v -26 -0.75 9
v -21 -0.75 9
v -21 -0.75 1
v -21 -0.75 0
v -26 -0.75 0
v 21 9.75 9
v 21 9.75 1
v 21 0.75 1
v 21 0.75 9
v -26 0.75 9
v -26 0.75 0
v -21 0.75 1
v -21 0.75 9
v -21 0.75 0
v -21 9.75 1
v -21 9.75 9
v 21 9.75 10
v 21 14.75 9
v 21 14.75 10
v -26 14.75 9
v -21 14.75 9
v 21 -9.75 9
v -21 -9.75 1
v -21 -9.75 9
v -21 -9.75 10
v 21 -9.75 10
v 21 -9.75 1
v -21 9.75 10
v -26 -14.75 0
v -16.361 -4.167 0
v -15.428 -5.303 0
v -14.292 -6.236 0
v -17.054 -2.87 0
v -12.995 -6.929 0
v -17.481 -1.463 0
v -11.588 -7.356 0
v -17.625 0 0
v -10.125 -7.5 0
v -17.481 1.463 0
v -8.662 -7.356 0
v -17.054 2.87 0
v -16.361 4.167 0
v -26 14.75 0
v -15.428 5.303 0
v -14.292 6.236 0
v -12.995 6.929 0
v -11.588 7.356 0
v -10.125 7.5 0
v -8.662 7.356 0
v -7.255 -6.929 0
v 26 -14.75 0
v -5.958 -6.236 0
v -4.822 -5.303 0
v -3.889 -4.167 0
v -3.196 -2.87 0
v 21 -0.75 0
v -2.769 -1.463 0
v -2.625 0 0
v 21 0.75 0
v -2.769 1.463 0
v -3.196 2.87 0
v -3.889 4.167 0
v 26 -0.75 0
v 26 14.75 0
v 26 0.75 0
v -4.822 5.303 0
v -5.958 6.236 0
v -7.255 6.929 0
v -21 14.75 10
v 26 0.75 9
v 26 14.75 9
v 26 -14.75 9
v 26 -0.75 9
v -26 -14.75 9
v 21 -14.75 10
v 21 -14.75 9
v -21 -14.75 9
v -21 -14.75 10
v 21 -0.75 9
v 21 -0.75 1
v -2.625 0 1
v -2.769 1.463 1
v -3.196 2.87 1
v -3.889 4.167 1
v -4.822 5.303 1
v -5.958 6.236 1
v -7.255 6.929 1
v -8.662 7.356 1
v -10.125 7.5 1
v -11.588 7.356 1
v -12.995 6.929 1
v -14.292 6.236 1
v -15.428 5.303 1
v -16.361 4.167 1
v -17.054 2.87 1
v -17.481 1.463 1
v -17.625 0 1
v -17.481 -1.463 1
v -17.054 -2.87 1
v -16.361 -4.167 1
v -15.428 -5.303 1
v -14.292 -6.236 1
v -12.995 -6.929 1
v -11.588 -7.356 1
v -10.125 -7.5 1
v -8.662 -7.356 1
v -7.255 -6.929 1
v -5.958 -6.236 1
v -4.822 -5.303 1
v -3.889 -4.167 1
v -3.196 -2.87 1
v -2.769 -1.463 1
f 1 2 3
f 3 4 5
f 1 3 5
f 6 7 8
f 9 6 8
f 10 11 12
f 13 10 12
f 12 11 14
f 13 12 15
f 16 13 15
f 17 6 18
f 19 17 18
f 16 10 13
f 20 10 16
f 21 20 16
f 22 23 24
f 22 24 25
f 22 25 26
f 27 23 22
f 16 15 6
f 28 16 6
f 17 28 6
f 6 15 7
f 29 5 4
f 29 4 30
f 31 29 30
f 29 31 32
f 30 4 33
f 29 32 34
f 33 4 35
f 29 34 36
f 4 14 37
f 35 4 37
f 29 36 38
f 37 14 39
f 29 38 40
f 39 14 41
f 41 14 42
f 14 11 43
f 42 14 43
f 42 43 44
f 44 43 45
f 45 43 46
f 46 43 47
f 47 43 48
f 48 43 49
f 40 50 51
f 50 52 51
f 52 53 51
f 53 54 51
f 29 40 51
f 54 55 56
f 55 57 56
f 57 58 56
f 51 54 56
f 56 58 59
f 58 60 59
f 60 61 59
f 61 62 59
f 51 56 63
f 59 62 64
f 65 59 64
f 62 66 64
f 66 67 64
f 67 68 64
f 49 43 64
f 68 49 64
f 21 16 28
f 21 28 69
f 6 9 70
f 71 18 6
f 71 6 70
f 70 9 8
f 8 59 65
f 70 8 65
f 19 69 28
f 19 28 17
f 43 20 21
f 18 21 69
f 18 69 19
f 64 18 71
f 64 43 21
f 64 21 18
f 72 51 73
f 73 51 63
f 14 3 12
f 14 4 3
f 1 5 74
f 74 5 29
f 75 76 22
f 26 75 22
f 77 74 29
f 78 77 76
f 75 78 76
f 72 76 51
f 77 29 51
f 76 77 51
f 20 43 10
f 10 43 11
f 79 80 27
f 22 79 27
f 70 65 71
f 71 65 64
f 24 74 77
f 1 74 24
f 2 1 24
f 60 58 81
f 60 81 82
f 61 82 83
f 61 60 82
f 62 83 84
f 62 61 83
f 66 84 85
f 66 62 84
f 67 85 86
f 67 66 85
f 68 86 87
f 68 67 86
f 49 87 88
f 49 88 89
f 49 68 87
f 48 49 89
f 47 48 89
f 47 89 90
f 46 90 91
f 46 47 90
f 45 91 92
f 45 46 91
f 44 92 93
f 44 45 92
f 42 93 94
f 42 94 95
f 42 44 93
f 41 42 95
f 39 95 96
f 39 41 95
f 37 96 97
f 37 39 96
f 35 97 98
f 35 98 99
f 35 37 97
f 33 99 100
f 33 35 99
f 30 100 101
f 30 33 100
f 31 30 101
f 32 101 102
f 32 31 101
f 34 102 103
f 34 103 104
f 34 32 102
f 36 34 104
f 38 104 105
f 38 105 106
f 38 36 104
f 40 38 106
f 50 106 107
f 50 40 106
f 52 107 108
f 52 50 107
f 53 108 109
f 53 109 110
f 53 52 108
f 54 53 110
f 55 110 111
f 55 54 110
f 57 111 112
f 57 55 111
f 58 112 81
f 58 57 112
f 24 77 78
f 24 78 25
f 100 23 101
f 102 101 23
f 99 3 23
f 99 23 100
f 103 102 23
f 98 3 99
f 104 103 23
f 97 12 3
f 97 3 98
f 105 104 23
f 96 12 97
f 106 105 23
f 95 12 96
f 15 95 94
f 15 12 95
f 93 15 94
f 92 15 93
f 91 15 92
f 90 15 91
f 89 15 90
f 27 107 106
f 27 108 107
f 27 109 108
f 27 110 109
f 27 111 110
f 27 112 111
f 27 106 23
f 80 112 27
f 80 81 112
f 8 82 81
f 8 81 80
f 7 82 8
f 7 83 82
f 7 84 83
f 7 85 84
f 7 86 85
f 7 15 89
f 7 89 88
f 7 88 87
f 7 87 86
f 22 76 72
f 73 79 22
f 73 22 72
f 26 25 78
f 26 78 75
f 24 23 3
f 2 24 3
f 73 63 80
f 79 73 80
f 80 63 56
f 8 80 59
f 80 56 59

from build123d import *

# Parameters (mm, degrees)
F0_W     = 42
F0_H     = 19.5
F0_R     = 7.5
F1_DEPTH = 1
F2_W     = 42
F2_H     = 5
F3_DEPTH = 10
F4_DEPTH = 9


with BuildPart() as f1:
    # F0 (on Top) → F1 (new body)
    with BuildSketch(Plane.XY):
        Rectangle(F0_W, F0_H)
        Polygon((0.75, 8.25), (0.75, 0), (0.75, -8.25), (-18.5, -8.25), (-18.5, 8.25), align=None, mode=Mode.SUBTRACT)
        Polygon((0.75, -8.25), (0.75, 0), (0.75, 8.25), (-18.5, 8.25), (-18.5, -8.25), align=None)
        with Locations((-10.125, 0)):
            Circle(F0_R, mode=Mode.SUBTRACT)
    extrude(amount=F1_DEPTH)

    # F2 (on Top) → F3 (join)
    with BuildSketch(Plane.XY):
        with Locations((0, 12.25)):
            Rectangle(F2_W, F2_H)
        with Locations((0, -12.25)):
            Rectangle(F2_W, F2_H)
    extrude(amount=F3_DEPTH)

    # F2 (on Top) → F4 (join)
    with BuildSketch(Plane.XY):
        Polygon((-21, -9.75), (-21, -0.75), (-26, -0.75), (-26, -14.75), (-21, -14.75), align=None)
        Polygon((26, 14.75), (21, 14.75), (21, 9.75), (21, 0.75), (26, 0.75), align=None)
        Polygon((26, -0.75), (21, -0.75), (21, -9.75), (21, -14.75), (26, -14.75), align=None)
        Polygon((-21, 9.75), (-21, 14.75), (-26, 14.75), (-26, 0.75), (-21, 0.75), align=None)
    extrude(amount=F4_DEPTH)


solid = f1.part
